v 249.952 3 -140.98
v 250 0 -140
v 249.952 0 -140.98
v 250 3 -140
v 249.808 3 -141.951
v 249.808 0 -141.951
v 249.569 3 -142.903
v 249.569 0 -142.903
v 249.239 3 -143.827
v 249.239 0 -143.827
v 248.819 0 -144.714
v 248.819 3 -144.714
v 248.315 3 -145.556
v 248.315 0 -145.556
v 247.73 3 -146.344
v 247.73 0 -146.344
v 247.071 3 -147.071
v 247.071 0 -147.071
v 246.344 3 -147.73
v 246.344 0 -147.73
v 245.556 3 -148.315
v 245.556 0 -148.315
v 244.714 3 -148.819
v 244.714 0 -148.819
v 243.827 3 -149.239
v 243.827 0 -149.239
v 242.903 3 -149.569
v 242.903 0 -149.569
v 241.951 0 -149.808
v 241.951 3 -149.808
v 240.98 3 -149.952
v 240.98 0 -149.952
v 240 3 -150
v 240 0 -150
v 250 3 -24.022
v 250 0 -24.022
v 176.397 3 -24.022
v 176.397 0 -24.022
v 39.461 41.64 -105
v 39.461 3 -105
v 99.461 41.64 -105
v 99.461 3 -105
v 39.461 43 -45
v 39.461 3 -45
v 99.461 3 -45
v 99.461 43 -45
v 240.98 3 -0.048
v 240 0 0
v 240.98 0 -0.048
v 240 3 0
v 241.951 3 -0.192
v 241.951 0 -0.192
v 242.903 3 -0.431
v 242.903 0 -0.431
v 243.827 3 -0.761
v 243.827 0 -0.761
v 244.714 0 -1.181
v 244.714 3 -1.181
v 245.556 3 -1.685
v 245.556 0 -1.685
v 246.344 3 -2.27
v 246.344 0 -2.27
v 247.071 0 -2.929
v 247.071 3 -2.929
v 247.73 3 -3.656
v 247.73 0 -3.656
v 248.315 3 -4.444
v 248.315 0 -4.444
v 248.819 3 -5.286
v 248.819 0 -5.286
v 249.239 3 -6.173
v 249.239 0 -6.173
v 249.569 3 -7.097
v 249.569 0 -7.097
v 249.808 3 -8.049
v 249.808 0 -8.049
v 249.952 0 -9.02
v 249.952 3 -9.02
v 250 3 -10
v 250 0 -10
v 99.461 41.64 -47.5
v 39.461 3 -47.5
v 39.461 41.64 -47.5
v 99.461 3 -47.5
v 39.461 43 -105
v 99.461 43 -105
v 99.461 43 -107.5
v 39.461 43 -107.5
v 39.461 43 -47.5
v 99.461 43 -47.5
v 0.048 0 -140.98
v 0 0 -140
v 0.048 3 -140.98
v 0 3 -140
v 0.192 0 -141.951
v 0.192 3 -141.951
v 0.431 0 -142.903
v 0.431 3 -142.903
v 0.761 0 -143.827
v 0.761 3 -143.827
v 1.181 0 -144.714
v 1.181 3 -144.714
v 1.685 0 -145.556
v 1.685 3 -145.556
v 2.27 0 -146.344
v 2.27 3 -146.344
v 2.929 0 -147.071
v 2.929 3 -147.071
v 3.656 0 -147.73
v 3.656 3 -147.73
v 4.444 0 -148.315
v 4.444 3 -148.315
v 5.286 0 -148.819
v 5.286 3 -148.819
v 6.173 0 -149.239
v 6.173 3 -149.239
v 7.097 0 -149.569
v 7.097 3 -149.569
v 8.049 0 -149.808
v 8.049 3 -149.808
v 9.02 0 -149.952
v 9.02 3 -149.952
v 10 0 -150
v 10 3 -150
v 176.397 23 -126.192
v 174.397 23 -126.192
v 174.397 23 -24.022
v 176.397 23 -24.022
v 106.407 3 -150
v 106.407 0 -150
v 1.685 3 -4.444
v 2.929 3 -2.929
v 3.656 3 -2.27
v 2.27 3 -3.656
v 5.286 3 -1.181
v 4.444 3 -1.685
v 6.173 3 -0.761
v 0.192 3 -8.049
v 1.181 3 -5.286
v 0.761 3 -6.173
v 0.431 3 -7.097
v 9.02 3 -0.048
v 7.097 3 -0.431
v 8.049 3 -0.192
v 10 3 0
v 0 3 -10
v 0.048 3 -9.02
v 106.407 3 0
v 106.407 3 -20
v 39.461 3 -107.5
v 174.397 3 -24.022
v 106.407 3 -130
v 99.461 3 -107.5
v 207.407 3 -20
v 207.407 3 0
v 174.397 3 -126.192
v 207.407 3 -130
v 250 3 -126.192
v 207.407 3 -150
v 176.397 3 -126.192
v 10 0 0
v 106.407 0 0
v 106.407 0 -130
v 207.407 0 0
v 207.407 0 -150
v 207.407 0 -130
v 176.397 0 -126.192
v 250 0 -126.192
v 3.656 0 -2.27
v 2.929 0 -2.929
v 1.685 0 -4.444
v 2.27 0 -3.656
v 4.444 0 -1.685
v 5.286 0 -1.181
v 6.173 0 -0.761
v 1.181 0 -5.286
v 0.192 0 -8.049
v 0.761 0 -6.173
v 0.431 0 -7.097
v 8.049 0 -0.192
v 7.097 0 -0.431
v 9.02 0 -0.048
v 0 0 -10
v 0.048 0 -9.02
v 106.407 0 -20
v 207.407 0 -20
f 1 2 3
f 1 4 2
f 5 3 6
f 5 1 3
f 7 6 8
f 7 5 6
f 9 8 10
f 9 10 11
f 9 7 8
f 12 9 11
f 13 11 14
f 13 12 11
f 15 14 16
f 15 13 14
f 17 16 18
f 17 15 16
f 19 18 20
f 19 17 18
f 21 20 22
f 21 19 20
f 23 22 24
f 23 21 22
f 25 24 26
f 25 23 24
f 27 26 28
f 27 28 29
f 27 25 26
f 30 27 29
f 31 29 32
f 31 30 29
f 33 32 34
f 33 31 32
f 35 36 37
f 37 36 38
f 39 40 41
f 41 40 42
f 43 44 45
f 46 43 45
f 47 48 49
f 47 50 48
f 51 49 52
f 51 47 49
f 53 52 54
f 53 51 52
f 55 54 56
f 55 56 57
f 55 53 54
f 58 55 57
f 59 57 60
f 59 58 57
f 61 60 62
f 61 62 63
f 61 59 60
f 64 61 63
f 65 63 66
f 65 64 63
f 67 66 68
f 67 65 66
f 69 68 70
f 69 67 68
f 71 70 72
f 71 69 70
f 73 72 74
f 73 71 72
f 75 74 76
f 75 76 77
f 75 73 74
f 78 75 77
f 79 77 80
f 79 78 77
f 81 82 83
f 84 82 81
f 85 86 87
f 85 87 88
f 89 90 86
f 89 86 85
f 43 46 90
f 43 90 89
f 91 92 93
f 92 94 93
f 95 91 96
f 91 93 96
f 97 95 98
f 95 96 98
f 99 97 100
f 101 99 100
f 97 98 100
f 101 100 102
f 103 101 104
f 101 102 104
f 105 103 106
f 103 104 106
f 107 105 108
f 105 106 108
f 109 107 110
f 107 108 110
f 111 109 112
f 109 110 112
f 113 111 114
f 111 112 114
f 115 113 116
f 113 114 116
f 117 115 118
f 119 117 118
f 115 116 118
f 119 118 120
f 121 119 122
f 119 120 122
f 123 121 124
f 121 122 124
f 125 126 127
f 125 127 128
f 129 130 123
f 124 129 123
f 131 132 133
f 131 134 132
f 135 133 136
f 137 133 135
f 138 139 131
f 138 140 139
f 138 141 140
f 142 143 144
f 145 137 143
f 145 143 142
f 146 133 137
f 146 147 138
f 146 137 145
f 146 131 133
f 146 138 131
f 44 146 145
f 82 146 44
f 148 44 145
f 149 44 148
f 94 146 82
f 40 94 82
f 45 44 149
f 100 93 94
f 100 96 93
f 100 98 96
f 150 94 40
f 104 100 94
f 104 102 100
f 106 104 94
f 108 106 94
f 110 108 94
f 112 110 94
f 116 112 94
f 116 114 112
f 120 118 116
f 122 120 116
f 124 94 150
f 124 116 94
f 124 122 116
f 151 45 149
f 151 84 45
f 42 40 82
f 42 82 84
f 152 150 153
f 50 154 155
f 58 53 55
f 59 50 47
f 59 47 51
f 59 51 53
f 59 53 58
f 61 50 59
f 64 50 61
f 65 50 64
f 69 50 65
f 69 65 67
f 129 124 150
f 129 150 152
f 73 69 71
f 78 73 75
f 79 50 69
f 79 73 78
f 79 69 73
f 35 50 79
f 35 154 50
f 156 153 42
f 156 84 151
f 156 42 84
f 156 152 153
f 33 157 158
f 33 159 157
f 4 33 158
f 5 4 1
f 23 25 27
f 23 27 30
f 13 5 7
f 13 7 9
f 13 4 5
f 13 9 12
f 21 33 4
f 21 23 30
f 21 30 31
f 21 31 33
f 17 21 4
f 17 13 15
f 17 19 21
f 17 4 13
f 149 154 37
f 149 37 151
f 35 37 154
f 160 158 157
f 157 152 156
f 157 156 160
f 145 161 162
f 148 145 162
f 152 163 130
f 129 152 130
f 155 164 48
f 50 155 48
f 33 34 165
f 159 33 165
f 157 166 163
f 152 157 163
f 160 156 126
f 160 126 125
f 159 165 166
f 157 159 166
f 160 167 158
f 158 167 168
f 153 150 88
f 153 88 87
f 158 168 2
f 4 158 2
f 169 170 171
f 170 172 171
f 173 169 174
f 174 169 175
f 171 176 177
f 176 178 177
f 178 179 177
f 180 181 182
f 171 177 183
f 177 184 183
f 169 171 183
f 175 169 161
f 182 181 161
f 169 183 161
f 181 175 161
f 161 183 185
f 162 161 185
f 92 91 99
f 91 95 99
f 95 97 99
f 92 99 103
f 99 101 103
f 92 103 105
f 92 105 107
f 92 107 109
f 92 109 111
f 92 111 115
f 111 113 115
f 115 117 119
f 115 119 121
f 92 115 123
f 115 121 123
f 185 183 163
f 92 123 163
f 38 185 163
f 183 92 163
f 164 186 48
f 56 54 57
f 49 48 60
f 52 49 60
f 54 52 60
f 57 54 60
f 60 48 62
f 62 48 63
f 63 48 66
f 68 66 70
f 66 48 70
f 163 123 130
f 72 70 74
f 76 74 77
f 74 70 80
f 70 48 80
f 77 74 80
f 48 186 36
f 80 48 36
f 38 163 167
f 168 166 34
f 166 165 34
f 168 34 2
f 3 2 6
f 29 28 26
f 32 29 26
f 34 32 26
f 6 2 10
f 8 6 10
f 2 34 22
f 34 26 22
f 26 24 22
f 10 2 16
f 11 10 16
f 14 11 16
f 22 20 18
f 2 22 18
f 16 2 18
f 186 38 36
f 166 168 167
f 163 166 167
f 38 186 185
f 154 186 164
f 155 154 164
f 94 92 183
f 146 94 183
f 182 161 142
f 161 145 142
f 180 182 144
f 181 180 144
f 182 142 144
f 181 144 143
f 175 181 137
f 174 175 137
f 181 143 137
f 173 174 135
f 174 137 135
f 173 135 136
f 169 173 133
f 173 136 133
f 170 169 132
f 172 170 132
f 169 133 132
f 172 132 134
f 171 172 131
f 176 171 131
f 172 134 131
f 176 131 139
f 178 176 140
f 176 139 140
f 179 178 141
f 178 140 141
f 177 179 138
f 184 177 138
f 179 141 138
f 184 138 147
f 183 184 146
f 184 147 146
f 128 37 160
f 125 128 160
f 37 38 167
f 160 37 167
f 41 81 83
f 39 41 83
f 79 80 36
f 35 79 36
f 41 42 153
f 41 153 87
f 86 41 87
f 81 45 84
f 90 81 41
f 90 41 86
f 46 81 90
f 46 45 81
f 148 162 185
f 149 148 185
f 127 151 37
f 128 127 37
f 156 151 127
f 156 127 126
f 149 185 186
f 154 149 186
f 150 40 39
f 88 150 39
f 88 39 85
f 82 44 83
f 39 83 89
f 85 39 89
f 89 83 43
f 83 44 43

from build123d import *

# Parameters (mm, degrees)
BOSS_EXTRUDE1_DEPTH = 3
SKETCH2_W           = 60
SKETCH2_H           = 2.5
BOSS_EXTRUDE2_DEPTH = 40
SKETCH5_W           = 60
SKETCH5_H           = 1.359629359
BOSS_EXTRUDE5_DEPTH = 57.5
FILLET1_R           = 10
SKETCH6_W           = 2
SKETCH6_H           = 102.169483657
BOSS_EXTRUDE6_DEPTH = 20


with BuildPart() as part:
    # Sketch1 → Boss-Extrude1 (new body)
    with BuildSketch(Plane(origin=(0, 0, 0), x_dir=(1, 0, 0), z_dir=(0, 1, 0))):
        Polygon((106.407471576, 20), (207.407471576, 20), (207.407471576, 0), (250, 0), (250, 24.022028172), (176.397365129, 24.022028172), (176.397365129, 126.191511829), (250, 126.191511829), (250, 150), (207.407471576, 150), (207.407471576, 130), (106.407471576, 130), (106.407471576, 150), (0, 150), (0, 0), (106.407471576, 0), align=None)
    extrude(amount=BOSS_EXTRUDE1_DEPTH)

    # Sketch2 → Boss-Extrude2 (add)
    with BuildSketch(Plane(origin=(0, 3, 0), x_dir=(1, 0, 0), z_dir=(0, 1, 0))):
        with Locations((69.460984605, 106.25)):
            Rectangle(SKETCH2_W, SKETCH2_H)
        with Locations((69.460984605, 46.25)):
            Rectangle(SKETCH2_W, SKETCH2_H)
    extrude(amount=BOSS_EXTRUDE2_DEPTH)

    # Sketch5 → Boss-Extrude5 (add)
    with BuildSketch(Plane(origin=(0, 0, -47.5), x_dir=(-1, 0, 0), z_dir=(0, 0, -1))):
        with Locations((-69.460984605, 42.320185321)):
            Rectangle(SKETCH5_W, SKETCH5_H)
    extrude(amount=BOSS_EXTRUDE5_DEPTH)

    # Fillet1
    fillet1_edges = [part.edges().sort_by_distance(p)[0] for p in [
        (0, 1.5, -150),
        (250, 1.5, -150),
        (250, 1.5, 0),
        (0, 1.5, 0),
    ]]
    fillet(fillet1_edges, radius=FILLET1_R)

    # Sketch6 → Boss-Extrude6 (add)
    with BuildSketch(Plane(origin=(0, 3, 0), x_dir=(1, 0, 0), z_dir=(0, 1, 0))):
        with Locations((175.397365129, 75.106770001)):
            Rectangle(SKETCH6_W, SKETCH6_H)
    extrude(amount=BOSS_EXTRUDE6_DEPTH)


solid = part.part
